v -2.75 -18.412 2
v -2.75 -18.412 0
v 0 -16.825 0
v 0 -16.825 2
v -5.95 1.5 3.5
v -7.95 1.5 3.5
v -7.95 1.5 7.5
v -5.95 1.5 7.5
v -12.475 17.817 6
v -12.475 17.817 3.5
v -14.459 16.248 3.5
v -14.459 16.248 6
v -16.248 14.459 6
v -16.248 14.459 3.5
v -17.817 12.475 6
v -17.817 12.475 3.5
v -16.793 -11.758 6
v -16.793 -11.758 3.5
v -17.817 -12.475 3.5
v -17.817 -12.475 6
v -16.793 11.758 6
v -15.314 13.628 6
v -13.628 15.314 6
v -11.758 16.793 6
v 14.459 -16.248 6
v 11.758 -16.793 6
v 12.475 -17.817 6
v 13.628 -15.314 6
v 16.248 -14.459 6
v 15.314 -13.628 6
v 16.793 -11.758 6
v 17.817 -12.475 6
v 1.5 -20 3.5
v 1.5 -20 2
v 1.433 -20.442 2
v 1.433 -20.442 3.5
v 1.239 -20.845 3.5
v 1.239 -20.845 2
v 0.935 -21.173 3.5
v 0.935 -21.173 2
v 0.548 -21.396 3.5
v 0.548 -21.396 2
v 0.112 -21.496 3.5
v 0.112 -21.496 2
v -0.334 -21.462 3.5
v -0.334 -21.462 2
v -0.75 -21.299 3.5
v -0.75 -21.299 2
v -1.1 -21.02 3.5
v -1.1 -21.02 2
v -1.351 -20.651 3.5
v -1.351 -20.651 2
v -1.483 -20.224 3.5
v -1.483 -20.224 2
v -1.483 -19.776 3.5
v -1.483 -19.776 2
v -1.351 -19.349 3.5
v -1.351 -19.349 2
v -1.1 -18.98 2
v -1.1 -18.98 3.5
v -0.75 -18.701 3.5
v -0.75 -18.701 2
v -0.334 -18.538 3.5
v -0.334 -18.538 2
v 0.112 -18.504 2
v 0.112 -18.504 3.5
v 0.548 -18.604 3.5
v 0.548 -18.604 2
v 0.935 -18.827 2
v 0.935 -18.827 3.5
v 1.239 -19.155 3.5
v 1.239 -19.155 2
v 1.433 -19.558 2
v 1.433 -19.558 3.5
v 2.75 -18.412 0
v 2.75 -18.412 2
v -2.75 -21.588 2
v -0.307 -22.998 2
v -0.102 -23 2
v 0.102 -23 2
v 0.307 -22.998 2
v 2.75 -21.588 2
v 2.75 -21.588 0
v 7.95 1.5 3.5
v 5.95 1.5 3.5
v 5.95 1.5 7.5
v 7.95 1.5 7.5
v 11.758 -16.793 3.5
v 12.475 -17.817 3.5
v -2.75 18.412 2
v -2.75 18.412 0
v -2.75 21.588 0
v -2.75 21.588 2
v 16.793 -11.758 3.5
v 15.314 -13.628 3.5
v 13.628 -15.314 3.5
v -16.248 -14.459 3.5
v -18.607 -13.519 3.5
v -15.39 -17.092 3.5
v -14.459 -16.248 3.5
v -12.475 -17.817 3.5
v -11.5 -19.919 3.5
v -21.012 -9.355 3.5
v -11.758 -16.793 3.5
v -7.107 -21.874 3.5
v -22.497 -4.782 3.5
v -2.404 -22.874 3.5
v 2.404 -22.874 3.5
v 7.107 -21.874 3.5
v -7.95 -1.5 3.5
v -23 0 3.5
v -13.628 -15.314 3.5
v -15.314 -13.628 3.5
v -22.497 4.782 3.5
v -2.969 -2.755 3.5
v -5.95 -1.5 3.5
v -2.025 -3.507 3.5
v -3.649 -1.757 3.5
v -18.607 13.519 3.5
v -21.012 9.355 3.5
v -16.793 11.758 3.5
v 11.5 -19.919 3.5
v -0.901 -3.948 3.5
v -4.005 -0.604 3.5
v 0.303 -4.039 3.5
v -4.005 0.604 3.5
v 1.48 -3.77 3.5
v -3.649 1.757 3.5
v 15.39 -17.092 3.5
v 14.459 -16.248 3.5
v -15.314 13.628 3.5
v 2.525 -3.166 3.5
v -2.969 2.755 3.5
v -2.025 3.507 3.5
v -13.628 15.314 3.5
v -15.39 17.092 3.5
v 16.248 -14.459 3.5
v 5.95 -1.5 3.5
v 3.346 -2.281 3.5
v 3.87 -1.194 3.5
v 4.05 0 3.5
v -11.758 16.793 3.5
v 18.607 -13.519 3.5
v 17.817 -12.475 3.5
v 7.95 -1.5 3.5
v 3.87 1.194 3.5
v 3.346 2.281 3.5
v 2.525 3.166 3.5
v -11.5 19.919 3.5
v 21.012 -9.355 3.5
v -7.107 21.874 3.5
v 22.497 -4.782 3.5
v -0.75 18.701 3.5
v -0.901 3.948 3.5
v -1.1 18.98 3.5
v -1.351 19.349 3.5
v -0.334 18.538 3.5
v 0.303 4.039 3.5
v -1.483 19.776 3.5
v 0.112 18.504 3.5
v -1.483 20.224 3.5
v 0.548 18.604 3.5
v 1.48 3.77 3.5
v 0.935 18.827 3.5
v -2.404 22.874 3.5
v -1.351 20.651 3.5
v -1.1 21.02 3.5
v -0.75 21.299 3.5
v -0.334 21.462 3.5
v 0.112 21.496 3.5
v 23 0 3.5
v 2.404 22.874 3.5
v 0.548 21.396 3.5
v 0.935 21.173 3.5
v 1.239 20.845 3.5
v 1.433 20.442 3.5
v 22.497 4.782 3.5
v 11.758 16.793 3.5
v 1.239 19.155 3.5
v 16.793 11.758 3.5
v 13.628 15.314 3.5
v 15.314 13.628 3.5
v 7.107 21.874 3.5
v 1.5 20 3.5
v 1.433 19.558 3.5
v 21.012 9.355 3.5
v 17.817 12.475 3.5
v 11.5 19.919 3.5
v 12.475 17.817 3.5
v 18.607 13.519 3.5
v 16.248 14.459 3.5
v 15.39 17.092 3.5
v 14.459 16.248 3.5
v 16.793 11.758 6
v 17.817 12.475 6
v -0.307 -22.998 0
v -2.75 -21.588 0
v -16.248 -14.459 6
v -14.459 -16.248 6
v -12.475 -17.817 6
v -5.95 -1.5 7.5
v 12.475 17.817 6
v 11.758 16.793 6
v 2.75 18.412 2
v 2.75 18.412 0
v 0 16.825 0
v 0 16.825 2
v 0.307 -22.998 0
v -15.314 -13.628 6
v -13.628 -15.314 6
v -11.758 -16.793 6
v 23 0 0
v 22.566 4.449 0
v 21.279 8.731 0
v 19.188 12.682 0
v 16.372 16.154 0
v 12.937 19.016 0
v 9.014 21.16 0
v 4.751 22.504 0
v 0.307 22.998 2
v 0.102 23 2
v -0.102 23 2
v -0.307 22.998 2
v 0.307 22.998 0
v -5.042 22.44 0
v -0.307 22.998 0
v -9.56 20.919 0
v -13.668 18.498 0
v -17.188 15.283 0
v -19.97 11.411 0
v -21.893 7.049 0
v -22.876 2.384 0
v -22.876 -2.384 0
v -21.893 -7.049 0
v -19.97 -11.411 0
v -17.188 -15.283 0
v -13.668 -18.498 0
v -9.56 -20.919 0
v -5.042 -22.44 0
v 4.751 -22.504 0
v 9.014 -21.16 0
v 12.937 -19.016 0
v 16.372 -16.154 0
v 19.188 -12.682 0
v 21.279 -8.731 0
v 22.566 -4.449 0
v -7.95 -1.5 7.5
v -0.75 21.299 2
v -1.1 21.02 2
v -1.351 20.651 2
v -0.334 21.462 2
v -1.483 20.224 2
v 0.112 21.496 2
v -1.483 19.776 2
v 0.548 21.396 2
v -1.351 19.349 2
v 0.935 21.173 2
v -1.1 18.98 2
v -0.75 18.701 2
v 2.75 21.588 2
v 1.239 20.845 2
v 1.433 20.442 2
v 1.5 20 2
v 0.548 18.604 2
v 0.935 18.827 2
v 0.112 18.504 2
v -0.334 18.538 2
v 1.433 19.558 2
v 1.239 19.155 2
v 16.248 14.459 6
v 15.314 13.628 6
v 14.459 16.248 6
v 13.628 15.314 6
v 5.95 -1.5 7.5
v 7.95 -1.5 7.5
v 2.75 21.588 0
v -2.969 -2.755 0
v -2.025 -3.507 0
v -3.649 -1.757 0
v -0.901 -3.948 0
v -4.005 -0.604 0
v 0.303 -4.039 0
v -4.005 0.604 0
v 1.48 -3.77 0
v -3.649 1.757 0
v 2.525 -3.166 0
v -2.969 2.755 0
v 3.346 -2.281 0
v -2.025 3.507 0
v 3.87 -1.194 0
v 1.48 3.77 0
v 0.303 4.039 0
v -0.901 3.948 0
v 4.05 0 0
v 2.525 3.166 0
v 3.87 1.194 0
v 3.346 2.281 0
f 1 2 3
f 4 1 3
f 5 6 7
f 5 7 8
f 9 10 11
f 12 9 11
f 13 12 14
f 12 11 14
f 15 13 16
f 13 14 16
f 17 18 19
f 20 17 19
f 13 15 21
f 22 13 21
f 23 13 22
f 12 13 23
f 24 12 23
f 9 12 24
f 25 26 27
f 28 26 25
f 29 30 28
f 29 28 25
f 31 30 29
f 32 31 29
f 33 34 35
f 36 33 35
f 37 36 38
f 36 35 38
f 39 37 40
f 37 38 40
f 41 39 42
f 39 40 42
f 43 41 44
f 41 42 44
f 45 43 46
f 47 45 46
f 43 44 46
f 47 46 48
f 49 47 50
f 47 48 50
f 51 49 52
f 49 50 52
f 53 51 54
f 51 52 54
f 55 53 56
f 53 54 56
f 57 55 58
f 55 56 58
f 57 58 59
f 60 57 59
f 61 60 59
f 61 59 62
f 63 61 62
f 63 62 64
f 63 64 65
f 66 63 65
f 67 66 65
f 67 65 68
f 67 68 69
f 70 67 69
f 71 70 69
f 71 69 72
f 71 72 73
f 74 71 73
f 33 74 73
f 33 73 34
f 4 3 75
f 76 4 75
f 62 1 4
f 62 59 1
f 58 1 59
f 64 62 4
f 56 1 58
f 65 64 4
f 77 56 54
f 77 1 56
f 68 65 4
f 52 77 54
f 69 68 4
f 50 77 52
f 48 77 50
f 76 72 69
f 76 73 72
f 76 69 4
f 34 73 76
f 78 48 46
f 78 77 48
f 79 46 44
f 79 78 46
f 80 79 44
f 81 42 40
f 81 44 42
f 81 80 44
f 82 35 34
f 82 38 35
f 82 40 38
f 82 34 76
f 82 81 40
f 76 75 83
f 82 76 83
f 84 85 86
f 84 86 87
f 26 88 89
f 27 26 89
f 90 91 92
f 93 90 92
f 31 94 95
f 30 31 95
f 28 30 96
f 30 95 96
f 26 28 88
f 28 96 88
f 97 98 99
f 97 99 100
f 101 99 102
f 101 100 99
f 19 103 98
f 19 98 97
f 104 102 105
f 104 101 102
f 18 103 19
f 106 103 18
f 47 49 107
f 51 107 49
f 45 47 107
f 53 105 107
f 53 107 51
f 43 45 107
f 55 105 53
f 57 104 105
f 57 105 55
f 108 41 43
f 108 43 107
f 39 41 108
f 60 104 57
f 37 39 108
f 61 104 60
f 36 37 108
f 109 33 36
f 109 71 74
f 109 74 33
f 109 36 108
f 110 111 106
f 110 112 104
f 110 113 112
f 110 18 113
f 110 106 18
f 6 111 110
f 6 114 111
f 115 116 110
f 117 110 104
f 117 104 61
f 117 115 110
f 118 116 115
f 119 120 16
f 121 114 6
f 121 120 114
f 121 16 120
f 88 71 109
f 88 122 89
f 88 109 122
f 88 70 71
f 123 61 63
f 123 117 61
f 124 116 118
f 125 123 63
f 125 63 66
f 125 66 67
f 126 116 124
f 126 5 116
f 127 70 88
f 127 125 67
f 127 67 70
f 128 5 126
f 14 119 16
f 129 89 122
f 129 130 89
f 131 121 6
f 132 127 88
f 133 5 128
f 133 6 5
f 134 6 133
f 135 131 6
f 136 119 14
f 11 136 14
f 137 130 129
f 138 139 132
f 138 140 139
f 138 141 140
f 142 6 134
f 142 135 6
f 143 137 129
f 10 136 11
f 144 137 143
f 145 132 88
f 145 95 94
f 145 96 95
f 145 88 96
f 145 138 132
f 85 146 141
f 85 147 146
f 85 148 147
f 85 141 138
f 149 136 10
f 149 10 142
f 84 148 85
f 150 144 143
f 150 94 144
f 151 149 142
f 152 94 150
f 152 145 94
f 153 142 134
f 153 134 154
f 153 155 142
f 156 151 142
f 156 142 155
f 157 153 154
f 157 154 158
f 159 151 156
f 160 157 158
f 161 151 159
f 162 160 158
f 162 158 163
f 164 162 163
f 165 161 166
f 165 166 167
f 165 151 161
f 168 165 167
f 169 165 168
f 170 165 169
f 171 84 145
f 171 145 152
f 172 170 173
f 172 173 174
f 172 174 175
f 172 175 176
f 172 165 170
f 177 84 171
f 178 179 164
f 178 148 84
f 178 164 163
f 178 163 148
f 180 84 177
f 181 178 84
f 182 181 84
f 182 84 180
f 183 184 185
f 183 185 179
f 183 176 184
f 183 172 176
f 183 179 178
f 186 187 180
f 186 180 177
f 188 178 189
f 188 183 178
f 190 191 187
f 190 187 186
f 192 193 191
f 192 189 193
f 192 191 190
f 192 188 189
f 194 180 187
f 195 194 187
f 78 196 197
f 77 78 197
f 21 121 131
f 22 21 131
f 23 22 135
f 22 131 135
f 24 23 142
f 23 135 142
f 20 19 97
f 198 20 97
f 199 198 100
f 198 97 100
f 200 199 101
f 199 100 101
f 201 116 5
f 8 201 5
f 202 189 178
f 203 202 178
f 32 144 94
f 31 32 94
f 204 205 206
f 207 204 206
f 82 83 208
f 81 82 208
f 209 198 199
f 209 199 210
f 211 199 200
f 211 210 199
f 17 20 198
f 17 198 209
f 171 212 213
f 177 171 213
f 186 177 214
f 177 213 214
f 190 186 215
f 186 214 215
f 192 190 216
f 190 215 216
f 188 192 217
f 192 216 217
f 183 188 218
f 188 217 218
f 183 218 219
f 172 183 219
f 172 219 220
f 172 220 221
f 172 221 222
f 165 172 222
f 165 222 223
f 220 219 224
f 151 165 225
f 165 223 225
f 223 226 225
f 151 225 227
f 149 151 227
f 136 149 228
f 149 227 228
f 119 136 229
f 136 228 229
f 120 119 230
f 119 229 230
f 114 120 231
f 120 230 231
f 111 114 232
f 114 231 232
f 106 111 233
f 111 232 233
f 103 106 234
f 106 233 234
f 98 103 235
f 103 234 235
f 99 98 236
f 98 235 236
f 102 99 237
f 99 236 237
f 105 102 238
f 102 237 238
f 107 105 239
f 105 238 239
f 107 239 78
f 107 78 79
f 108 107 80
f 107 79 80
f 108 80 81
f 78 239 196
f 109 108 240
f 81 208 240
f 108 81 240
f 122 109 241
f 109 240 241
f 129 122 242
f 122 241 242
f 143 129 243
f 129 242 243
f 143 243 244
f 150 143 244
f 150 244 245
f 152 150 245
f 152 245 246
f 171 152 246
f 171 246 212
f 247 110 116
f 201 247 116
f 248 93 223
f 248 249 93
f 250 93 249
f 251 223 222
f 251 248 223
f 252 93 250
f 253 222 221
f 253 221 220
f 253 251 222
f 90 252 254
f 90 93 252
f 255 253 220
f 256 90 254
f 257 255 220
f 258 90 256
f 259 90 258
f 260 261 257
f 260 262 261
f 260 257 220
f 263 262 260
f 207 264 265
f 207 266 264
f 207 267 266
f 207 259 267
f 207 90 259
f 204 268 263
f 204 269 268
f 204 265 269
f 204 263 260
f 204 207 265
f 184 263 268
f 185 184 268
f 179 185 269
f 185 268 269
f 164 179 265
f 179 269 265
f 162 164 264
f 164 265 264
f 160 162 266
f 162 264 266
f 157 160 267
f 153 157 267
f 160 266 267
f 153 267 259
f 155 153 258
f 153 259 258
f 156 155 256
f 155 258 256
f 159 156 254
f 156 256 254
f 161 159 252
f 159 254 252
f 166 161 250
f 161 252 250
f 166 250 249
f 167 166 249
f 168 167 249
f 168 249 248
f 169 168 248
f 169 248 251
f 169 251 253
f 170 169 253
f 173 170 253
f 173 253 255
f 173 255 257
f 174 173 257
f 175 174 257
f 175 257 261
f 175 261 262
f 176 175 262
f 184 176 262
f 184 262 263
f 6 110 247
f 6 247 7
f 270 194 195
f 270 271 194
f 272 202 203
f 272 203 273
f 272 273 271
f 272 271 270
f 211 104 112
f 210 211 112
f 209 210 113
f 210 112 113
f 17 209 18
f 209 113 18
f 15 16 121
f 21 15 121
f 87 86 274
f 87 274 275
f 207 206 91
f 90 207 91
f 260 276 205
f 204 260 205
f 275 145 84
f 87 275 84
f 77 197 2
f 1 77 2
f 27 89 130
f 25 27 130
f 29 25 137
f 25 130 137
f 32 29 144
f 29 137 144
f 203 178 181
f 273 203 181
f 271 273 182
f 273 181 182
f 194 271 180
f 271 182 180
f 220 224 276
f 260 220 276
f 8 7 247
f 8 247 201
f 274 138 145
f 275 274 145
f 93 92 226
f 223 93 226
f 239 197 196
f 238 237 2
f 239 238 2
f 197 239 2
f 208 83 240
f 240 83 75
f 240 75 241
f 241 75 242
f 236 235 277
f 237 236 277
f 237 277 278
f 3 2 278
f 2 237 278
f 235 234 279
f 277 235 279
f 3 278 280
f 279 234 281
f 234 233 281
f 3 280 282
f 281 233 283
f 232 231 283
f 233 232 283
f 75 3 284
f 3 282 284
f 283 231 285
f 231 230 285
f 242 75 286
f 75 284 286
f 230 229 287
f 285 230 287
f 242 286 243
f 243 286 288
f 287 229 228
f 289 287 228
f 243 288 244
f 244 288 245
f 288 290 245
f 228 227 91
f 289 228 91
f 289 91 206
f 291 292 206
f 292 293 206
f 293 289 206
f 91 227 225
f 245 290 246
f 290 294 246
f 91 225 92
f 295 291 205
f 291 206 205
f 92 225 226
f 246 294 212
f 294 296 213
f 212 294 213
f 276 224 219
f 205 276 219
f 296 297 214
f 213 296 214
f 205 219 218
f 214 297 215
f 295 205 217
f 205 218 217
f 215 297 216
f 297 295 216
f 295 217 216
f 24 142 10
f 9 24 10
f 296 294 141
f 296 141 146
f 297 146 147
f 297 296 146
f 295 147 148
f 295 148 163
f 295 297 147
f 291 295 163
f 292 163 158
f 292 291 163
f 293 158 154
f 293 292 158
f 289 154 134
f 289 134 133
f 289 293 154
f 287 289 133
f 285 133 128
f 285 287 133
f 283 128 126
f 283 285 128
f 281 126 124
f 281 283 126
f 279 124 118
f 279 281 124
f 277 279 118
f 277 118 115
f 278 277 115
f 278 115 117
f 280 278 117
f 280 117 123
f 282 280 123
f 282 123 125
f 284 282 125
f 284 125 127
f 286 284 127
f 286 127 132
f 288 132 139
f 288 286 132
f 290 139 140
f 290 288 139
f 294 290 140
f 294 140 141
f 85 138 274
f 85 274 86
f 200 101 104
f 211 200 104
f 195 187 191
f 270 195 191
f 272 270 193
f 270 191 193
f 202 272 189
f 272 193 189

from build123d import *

# Parameters (mm, degrees)
F0_R     = 23
F0_R_2   = 4.05
F1_DEPTH = 3.5
F3_DEPTH = 2.5
F4_W     = 2
F4_H     = 3
F5_DEPTH = 4
F6_R     = 1.5
F7_DEPTH = 25
F9_DEPTH = 2


with BuildPart() as f1:
    # F0 (on Top) → F1 (new body)
    with BuildSketch(Plane.XY):
        Circle(F0_R)
        Circle(F0_R_2, mode=Mode.SUBTRACT)
    extrude(amount=F1_DEPTH)

    # F2 (on face) → F3 (join)
    with BuildSketch(Plane.XY.offset(3.5)):
        with BuildLine():
            Line((16.792617, 11.758317), (17.816557, 12.475287))
            ThreePointArc((17.816557, 12.475287), (15.379572, 15.379572), (12.475287, 17.816557))
            Line((12.475287, 17.816557), (11.758317, 16.792617))
            ThreePointArc((11.758317, 16.792617), (14.495689, 14.495689), (16.792617, 11.758317))
        make_face()
        with BuildLine():
            ThreePointArc((-16.792617, 11.758317), (-14.495689, 14.495689), (-11.758317, 16.792617))
            Line((-11.758317, 16.792617), (-12.475287, 17.816557))
            ThreePointArc((-12.475287, 17.816557), (-15.379572, 15.379572), (-17.816557, 12.475287))
            Line((-17.816557, 12.475287), (-16.792617, 11.758317))
        make_face()
        with BuildLine():
            ThreePointArc((-11.758317, -16.792617), (-14.495689, -14.495689), (-16.792617, -11.758317))
            Line((-16.792617, -11.758317), (-17.816557, -12.475287))
            ThreePointArc((-17.816557, -12.475287), (-15.379572, -15.379572), (-12.475287, -17.816557))
            Line((-12.475287, -17.816557), (-11.758317, -16.792617))
        make_face()
        with BuildLine():
            ThreePointArc((16.792617, -11.758317), (14.495689, -14.495689), (11.758317, -16.792617))
            Line((11.758317, -16.792617), (12.475287, -17.816557))
            ThreePointArc((12.475287, -17.816557), (15.379572, -15.379572), (17.816557, -12.475287))
            Line((17.816557, -12.475287), (16.792617, -11.758317))
        make_face()
    extrude(amount=F3_DEPTH)

    # F4 (on face) → F5 (join)
    with BuildSketch(Plane.XY.offset(3.5)):
        with Locations((6.95, 0)):
            Rectangle(F4_W, F4_H)
        with Locations((-6.95, 0)):
            Rectangle(F4_W, F4_H)
    extrude(amount=F5_DEPTH)

    # F6 (on face) → F7 (cut)
    with BuildSketch(Plane(origin=(0, 0, 0), x_dir=(1, 0, 0), z_dir=(0, 0, -1))):
        with Locations((0, 20)):
            Circle(F6_R)
        with Locations((0, -20)):
            Circle(F6_R)
    extrude(amount=-F7_DEPTH, mode=Mode.SUBTRACT)

    # F8 (on face) → F9 (cut)
    with BuildSketch(Plane(origin=(0, 0, 0), x_dir=(1, 0, 0), z_dir=(0, 0, -1))):
        Polygon((-2.75, 21.587713), (-2.75, 18.412287), (0, 16.824574), (2.75, 18.412287), (2.75, 21.587713), (0, 23.175426), align=None)
        Polygon((2.75, -21.587713), (2.75, -18.412287), (0, -16.824574), (-2.75, -18.412287), (-2.75, -21.587713), (0, -23.175426), align=None)
    extrude(amount=-F9_DEPTH, mode=Mode.SUBTRACT)


solid = f1.part
